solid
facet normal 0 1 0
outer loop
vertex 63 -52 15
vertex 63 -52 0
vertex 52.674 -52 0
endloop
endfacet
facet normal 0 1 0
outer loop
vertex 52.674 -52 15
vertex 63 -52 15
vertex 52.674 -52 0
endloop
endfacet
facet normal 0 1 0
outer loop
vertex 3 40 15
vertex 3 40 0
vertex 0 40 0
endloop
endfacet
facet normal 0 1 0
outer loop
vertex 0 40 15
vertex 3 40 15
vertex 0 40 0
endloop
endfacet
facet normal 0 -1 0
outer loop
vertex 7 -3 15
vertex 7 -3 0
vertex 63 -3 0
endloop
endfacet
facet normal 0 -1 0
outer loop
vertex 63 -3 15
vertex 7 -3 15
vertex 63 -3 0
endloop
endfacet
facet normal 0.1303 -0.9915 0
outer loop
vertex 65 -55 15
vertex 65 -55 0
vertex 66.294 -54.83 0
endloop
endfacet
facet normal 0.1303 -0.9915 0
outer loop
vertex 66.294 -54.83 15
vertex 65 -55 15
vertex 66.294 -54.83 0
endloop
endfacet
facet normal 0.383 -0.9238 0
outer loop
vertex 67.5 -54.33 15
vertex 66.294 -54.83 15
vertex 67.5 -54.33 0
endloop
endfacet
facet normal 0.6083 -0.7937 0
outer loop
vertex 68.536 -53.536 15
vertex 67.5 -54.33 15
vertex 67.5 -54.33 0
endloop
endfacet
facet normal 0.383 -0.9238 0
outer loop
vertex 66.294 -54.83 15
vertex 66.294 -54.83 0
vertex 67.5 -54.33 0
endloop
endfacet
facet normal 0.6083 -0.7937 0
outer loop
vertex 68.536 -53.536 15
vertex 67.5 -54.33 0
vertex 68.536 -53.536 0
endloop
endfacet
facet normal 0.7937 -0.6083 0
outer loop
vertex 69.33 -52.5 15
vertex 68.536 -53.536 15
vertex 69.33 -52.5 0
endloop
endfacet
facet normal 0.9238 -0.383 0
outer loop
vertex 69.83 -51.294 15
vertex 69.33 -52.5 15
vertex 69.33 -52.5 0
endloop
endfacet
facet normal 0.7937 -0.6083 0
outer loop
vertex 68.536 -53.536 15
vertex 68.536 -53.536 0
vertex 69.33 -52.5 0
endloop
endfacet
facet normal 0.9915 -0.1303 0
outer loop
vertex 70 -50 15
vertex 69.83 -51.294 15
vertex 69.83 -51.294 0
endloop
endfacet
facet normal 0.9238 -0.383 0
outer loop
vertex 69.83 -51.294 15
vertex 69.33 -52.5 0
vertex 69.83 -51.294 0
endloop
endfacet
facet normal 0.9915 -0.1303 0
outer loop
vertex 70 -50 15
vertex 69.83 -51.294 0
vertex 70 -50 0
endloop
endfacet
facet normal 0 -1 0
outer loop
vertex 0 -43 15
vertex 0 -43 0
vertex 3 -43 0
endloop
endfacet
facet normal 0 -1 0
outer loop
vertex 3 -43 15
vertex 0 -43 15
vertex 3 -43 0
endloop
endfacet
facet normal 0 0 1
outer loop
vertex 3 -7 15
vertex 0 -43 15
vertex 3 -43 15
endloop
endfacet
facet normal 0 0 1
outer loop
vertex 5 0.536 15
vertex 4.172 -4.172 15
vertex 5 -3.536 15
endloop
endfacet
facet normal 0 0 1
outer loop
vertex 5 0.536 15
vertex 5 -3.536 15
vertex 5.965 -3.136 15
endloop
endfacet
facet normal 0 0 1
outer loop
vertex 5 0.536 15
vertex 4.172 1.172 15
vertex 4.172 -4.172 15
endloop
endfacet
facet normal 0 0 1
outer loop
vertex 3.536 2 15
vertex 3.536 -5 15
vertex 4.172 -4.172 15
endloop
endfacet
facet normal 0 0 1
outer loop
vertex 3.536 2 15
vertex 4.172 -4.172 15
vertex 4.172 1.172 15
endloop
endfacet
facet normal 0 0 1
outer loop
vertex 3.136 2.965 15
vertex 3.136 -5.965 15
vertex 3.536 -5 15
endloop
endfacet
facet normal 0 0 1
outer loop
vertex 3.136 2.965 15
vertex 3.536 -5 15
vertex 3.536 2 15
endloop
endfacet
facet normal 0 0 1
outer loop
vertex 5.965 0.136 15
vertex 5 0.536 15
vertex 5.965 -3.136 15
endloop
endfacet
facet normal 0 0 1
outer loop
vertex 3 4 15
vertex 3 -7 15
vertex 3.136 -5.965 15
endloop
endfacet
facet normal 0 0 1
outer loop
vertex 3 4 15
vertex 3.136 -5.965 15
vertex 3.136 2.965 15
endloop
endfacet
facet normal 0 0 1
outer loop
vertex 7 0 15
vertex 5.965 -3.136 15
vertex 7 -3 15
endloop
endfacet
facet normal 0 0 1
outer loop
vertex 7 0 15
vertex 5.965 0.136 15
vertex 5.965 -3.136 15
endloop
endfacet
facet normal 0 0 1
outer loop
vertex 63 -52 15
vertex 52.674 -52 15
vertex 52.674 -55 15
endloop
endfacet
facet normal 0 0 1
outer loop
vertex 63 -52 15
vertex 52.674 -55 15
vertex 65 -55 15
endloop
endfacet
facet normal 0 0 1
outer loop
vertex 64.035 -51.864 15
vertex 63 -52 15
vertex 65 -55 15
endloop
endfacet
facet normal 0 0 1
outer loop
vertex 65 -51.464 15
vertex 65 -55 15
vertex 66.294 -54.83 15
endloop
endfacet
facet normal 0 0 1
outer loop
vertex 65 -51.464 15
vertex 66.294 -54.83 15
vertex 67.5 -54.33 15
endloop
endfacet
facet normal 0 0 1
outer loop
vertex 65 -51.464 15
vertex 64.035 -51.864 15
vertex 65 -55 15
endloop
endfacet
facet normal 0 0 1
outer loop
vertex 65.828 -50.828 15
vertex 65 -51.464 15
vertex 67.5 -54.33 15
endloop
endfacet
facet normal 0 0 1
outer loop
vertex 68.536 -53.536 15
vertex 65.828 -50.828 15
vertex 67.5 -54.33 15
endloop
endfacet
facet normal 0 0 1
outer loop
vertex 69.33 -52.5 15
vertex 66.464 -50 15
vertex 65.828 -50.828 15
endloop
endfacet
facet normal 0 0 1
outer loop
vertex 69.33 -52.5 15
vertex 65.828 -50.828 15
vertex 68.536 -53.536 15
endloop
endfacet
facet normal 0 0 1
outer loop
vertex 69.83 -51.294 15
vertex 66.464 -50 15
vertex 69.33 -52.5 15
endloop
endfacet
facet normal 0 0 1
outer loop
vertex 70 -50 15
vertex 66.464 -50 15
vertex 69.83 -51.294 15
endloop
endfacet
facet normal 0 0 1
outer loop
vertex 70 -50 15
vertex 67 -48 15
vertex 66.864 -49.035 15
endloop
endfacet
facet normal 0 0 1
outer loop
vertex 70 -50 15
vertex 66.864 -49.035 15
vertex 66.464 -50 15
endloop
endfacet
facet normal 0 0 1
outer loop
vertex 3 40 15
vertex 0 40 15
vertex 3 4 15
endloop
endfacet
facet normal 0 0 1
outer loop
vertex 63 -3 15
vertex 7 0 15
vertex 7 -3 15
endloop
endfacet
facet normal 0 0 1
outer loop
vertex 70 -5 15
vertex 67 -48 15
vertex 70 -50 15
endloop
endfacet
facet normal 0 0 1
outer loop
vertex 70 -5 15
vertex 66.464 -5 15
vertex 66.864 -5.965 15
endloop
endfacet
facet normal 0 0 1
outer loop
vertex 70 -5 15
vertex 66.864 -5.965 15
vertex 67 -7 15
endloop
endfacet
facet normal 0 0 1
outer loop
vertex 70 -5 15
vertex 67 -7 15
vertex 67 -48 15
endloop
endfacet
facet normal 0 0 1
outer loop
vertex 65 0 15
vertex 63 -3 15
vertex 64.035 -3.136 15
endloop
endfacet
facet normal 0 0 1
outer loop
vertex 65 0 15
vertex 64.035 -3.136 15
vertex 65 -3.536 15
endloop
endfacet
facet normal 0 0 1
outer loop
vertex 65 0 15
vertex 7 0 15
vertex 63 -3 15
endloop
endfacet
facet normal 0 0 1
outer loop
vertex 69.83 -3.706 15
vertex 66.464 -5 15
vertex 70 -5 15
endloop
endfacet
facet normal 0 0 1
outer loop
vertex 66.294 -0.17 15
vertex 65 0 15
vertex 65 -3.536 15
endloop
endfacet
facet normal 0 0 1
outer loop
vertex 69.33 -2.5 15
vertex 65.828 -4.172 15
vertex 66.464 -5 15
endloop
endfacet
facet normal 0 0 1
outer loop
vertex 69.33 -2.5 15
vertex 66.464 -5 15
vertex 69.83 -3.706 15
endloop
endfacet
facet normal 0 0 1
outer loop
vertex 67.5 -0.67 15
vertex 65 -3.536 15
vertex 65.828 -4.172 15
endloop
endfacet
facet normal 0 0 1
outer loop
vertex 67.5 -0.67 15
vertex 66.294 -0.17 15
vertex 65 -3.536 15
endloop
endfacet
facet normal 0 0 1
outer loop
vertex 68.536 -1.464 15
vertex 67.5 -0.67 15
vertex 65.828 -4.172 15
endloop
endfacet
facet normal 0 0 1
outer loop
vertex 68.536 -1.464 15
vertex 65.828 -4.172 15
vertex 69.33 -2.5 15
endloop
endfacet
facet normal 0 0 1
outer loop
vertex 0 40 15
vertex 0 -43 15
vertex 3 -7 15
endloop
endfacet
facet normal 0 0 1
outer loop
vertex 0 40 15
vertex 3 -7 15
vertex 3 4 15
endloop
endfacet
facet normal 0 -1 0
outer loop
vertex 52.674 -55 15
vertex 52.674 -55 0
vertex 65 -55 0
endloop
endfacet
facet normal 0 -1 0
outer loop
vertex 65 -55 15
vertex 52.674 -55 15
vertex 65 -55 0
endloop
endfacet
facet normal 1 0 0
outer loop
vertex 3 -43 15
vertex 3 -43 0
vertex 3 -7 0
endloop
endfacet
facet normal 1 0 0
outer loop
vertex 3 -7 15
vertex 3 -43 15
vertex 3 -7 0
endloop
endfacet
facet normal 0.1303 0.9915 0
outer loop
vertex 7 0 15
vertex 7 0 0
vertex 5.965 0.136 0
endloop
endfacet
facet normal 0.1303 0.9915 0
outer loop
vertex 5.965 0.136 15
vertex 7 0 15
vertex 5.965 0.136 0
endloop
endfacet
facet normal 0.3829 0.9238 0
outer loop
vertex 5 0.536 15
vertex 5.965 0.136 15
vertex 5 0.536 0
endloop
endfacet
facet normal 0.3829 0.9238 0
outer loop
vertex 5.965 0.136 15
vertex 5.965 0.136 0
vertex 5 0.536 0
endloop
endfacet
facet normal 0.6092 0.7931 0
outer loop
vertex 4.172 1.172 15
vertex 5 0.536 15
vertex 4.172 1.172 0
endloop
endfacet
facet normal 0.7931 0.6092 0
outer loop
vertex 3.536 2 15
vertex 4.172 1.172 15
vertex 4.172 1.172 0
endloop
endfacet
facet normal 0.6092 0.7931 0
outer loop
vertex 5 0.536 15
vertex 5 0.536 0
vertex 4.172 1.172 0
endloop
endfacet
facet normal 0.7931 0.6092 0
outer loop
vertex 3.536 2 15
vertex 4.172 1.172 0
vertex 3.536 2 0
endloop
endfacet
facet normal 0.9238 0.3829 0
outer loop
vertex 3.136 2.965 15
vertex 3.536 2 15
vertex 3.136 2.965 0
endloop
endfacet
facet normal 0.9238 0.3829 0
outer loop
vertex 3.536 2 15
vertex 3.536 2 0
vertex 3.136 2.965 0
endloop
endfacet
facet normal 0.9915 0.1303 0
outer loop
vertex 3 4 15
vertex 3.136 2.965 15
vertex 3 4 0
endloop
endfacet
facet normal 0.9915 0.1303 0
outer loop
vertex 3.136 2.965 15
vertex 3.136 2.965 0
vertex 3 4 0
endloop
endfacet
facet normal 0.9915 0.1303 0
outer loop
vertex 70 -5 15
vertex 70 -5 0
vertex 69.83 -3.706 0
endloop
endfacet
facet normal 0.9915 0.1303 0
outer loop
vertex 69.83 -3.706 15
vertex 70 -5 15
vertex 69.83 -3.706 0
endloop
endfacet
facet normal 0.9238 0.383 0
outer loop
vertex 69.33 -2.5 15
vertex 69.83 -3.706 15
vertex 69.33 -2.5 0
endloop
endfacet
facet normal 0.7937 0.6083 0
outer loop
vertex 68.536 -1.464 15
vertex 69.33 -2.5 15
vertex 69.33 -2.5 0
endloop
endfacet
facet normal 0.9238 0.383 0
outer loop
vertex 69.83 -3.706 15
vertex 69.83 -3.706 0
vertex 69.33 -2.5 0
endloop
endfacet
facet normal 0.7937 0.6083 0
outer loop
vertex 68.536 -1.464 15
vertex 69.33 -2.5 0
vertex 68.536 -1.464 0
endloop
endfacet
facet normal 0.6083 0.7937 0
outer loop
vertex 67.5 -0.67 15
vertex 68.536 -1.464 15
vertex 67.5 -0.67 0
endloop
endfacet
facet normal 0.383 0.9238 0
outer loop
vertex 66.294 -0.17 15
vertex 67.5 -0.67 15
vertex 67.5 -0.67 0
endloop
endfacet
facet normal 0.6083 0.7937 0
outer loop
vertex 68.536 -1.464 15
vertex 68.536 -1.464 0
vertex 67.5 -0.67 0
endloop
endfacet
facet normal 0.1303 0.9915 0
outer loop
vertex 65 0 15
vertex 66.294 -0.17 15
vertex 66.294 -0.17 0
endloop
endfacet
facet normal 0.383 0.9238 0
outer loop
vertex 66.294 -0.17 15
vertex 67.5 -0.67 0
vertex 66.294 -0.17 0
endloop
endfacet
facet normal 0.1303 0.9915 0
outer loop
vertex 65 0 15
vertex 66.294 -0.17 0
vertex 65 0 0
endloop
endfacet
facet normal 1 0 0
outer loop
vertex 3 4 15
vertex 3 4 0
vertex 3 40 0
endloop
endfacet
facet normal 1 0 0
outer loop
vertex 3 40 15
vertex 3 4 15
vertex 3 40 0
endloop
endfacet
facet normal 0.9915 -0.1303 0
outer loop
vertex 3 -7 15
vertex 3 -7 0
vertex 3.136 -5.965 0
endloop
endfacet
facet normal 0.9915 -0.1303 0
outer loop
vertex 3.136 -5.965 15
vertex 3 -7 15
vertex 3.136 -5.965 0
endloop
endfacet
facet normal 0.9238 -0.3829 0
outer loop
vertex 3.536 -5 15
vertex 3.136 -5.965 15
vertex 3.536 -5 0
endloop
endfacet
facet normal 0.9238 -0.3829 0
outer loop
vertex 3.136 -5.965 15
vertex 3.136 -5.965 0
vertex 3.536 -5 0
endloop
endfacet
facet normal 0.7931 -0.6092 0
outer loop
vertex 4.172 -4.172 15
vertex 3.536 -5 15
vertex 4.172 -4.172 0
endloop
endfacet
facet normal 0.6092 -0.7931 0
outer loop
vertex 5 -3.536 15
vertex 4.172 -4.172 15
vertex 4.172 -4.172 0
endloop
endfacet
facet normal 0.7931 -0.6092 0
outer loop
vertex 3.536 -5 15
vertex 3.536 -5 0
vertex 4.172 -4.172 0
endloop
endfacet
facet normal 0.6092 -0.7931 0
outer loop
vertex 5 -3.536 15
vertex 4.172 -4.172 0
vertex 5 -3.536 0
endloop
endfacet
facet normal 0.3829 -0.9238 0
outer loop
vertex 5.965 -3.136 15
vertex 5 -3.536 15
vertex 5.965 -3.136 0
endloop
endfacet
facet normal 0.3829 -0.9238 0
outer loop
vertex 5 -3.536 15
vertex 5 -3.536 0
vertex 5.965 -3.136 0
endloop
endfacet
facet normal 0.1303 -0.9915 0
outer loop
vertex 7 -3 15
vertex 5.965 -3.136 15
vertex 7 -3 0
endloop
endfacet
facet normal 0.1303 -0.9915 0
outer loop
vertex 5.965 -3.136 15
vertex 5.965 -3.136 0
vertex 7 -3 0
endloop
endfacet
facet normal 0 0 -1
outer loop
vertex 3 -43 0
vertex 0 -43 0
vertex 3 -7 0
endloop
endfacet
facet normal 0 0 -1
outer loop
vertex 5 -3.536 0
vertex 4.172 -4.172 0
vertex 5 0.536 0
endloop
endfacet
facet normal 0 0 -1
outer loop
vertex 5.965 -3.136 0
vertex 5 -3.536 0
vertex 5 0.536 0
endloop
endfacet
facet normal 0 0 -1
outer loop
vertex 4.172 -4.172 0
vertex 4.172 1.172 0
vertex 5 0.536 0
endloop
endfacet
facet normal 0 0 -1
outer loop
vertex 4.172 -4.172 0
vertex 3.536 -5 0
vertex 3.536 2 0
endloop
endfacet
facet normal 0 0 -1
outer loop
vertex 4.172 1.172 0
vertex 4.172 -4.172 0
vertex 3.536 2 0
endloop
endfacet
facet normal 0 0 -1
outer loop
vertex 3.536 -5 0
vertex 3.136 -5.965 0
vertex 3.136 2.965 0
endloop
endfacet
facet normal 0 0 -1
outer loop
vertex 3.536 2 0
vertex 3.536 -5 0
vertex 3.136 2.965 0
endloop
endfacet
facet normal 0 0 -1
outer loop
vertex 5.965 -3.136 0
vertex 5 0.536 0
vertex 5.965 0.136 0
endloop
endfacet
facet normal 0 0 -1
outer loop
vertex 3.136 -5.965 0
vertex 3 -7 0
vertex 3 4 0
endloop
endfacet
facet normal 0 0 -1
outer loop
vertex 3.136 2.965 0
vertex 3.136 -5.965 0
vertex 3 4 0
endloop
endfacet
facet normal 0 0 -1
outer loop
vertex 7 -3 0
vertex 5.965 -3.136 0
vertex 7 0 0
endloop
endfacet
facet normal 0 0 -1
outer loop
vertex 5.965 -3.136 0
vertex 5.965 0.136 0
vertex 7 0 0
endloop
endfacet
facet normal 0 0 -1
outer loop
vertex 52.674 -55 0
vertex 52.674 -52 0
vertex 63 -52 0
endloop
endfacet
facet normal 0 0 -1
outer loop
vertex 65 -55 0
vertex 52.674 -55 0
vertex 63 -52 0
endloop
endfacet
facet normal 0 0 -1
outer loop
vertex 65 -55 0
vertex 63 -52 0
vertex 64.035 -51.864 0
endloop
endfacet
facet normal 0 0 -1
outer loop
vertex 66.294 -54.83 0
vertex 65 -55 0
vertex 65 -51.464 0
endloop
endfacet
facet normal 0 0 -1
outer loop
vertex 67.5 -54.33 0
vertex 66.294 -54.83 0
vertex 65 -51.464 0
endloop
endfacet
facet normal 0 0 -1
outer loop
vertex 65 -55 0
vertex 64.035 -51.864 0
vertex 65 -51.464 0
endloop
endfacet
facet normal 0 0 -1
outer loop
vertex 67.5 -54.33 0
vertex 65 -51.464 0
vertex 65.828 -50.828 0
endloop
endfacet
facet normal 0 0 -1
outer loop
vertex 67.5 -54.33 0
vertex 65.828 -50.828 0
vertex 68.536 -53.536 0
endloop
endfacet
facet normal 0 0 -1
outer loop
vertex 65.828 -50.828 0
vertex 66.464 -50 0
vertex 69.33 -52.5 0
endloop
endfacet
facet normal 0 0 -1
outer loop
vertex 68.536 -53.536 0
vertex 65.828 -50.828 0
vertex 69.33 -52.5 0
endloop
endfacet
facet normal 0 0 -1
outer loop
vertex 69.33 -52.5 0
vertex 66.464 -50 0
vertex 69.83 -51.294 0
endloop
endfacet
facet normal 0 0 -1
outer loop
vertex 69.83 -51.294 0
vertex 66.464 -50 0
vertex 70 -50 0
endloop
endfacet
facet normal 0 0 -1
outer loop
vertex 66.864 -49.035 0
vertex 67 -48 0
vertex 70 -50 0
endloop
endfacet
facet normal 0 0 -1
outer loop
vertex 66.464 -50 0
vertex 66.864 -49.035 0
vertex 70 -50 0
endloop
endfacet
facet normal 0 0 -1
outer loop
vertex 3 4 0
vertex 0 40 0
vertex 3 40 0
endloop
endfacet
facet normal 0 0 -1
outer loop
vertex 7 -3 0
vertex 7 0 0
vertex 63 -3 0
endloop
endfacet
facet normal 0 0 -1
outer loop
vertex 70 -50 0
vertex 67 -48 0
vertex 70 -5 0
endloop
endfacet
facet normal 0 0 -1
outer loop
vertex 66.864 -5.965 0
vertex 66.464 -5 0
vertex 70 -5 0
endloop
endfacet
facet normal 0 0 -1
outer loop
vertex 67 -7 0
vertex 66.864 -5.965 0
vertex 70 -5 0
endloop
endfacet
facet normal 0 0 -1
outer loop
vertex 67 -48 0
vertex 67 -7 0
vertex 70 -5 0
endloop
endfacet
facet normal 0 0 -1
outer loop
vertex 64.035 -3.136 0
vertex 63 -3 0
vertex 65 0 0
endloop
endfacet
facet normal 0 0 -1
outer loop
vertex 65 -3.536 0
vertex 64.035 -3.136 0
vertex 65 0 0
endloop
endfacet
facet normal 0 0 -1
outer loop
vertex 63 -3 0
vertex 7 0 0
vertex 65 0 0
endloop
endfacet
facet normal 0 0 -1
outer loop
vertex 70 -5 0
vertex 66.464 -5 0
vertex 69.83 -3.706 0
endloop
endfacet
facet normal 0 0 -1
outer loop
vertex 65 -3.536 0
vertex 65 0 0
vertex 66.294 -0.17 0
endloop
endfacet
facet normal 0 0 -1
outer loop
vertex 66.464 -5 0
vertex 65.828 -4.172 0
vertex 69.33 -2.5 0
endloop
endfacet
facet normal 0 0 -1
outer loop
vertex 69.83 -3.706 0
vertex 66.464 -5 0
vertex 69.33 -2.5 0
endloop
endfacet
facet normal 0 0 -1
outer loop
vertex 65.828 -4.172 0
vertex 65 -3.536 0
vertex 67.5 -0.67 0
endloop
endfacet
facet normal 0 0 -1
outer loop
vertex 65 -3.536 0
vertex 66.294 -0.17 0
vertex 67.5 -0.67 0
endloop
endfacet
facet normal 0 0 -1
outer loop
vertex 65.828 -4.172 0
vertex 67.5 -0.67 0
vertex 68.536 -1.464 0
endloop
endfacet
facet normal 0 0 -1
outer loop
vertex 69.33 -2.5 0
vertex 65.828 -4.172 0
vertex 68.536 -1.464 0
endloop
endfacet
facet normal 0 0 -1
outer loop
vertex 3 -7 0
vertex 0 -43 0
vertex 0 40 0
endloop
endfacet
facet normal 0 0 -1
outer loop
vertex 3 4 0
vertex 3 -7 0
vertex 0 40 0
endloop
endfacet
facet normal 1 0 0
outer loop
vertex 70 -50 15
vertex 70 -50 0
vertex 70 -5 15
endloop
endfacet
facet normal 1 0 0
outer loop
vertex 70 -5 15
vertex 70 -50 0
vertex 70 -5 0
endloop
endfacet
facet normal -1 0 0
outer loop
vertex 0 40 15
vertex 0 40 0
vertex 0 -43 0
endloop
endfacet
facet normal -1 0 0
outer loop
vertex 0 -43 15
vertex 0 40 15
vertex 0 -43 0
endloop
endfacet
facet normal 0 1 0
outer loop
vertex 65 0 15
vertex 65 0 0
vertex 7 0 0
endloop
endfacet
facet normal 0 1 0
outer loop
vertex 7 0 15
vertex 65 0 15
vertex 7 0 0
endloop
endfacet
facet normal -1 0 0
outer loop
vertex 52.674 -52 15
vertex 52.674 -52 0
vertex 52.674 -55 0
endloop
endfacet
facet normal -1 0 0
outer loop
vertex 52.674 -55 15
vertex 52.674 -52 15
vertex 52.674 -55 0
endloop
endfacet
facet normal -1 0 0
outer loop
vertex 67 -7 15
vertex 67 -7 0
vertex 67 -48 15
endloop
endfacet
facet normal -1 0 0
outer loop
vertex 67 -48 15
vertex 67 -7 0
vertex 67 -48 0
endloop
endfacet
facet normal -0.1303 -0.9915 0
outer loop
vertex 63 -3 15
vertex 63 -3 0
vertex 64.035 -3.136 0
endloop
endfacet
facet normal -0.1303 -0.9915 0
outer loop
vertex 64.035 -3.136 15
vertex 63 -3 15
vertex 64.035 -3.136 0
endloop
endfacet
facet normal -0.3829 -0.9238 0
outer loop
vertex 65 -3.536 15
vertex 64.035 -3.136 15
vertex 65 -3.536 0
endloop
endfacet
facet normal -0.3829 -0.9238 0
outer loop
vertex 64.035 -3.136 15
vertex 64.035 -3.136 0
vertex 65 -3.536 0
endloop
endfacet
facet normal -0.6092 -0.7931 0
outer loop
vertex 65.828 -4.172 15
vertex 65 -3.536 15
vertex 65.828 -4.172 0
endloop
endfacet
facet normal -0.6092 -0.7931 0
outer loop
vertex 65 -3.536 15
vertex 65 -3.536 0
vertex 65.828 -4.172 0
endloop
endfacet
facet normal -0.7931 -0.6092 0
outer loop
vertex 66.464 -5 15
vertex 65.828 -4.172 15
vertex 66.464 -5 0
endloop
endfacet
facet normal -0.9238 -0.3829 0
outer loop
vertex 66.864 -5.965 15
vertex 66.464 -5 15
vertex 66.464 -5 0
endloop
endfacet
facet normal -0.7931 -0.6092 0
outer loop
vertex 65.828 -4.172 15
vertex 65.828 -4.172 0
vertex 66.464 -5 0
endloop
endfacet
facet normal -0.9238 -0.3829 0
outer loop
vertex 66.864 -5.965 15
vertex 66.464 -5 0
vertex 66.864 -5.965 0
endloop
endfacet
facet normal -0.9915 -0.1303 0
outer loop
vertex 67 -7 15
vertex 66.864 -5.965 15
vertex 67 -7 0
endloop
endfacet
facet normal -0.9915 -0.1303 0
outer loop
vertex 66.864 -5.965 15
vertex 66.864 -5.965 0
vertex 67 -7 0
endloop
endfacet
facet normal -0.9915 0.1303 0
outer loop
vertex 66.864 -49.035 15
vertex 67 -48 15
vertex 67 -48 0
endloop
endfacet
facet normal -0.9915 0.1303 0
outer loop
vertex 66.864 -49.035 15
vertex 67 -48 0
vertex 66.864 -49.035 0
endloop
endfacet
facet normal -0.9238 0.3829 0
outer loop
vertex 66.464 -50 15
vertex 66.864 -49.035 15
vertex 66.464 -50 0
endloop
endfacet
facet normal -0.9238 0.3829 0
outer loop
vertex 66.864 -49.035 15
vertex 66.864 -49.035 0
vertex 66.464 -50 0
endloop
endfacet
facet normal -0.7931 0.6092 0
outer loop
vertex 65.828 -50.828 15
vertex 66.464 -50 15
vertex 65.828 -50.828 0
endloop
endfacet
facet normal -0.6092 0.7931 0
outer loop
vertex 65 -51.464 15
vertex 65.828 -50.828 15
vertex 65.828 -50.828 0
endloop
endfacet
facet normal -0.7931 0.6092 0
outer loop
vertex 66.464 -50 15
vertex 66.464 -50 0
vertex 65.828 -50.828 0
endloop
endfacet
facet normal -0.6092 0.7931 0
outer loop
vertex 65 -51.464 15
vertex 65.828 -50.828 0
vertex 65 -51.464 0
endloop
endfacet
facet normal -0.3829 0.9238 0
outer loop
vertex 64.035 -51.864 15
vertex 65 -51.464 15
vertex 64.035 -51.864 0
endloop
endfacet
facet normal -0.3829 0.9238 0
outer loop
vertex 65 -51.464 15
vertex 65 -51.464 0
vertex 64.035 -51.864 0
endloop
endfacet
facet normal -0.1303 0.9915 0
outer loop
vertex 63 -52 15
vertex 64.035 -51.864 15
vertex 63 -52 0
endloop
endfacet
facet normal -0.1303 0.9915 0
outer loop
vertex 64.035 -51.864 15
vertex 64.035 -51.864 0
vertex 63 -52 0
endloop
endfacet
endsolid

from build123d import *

# Parameters (mm, degrees)
F1_DEPTH = 15


with BuildPart() as f1:
    # F0 (on Top) → F1 (new body)
    with BuildSketch(Plane.XY):
        with BuildLine():
            Line((0, 40), (0, -43))
            Line((0, -43), (3, -43))
            Line((3, -43), (3, -7))
            ThreePointArc((3, -7), (4.171573, -4.171573), (7, -3))
            Line((7, -3), (63, -3))
            ThreePointArc((63, -3), (65.828427, -4.171573), (67, -7))
            Line((67, -7), (67, -48))
            ThreePointArc((67, -48), (65.828427, -50.828427), (63, -52))
            Line((63, -52), (52.673683, -52))
            Line((52.673683, -52), (52.673683, -55))
            Line((52.673683, -55), (65, -55))
            ThreePointArc((65, -55), (68.535534, -53.535534), (70, -50))
            Line((70, -50), (70, -5))
            ThreePointArc((70, -5), (68.535534, -1.464466), (65, 0))
            Line((65, 0), (7, 0))
            ThreePointArc((7, 0), (4.171573, 1.171573), (3, 4))
            Line((3, 4), (3, 40))
            Line((3, 40), (0, 40))
        make_face()
    extrude(amount=F1_DEPTH)


solid = f1.part
